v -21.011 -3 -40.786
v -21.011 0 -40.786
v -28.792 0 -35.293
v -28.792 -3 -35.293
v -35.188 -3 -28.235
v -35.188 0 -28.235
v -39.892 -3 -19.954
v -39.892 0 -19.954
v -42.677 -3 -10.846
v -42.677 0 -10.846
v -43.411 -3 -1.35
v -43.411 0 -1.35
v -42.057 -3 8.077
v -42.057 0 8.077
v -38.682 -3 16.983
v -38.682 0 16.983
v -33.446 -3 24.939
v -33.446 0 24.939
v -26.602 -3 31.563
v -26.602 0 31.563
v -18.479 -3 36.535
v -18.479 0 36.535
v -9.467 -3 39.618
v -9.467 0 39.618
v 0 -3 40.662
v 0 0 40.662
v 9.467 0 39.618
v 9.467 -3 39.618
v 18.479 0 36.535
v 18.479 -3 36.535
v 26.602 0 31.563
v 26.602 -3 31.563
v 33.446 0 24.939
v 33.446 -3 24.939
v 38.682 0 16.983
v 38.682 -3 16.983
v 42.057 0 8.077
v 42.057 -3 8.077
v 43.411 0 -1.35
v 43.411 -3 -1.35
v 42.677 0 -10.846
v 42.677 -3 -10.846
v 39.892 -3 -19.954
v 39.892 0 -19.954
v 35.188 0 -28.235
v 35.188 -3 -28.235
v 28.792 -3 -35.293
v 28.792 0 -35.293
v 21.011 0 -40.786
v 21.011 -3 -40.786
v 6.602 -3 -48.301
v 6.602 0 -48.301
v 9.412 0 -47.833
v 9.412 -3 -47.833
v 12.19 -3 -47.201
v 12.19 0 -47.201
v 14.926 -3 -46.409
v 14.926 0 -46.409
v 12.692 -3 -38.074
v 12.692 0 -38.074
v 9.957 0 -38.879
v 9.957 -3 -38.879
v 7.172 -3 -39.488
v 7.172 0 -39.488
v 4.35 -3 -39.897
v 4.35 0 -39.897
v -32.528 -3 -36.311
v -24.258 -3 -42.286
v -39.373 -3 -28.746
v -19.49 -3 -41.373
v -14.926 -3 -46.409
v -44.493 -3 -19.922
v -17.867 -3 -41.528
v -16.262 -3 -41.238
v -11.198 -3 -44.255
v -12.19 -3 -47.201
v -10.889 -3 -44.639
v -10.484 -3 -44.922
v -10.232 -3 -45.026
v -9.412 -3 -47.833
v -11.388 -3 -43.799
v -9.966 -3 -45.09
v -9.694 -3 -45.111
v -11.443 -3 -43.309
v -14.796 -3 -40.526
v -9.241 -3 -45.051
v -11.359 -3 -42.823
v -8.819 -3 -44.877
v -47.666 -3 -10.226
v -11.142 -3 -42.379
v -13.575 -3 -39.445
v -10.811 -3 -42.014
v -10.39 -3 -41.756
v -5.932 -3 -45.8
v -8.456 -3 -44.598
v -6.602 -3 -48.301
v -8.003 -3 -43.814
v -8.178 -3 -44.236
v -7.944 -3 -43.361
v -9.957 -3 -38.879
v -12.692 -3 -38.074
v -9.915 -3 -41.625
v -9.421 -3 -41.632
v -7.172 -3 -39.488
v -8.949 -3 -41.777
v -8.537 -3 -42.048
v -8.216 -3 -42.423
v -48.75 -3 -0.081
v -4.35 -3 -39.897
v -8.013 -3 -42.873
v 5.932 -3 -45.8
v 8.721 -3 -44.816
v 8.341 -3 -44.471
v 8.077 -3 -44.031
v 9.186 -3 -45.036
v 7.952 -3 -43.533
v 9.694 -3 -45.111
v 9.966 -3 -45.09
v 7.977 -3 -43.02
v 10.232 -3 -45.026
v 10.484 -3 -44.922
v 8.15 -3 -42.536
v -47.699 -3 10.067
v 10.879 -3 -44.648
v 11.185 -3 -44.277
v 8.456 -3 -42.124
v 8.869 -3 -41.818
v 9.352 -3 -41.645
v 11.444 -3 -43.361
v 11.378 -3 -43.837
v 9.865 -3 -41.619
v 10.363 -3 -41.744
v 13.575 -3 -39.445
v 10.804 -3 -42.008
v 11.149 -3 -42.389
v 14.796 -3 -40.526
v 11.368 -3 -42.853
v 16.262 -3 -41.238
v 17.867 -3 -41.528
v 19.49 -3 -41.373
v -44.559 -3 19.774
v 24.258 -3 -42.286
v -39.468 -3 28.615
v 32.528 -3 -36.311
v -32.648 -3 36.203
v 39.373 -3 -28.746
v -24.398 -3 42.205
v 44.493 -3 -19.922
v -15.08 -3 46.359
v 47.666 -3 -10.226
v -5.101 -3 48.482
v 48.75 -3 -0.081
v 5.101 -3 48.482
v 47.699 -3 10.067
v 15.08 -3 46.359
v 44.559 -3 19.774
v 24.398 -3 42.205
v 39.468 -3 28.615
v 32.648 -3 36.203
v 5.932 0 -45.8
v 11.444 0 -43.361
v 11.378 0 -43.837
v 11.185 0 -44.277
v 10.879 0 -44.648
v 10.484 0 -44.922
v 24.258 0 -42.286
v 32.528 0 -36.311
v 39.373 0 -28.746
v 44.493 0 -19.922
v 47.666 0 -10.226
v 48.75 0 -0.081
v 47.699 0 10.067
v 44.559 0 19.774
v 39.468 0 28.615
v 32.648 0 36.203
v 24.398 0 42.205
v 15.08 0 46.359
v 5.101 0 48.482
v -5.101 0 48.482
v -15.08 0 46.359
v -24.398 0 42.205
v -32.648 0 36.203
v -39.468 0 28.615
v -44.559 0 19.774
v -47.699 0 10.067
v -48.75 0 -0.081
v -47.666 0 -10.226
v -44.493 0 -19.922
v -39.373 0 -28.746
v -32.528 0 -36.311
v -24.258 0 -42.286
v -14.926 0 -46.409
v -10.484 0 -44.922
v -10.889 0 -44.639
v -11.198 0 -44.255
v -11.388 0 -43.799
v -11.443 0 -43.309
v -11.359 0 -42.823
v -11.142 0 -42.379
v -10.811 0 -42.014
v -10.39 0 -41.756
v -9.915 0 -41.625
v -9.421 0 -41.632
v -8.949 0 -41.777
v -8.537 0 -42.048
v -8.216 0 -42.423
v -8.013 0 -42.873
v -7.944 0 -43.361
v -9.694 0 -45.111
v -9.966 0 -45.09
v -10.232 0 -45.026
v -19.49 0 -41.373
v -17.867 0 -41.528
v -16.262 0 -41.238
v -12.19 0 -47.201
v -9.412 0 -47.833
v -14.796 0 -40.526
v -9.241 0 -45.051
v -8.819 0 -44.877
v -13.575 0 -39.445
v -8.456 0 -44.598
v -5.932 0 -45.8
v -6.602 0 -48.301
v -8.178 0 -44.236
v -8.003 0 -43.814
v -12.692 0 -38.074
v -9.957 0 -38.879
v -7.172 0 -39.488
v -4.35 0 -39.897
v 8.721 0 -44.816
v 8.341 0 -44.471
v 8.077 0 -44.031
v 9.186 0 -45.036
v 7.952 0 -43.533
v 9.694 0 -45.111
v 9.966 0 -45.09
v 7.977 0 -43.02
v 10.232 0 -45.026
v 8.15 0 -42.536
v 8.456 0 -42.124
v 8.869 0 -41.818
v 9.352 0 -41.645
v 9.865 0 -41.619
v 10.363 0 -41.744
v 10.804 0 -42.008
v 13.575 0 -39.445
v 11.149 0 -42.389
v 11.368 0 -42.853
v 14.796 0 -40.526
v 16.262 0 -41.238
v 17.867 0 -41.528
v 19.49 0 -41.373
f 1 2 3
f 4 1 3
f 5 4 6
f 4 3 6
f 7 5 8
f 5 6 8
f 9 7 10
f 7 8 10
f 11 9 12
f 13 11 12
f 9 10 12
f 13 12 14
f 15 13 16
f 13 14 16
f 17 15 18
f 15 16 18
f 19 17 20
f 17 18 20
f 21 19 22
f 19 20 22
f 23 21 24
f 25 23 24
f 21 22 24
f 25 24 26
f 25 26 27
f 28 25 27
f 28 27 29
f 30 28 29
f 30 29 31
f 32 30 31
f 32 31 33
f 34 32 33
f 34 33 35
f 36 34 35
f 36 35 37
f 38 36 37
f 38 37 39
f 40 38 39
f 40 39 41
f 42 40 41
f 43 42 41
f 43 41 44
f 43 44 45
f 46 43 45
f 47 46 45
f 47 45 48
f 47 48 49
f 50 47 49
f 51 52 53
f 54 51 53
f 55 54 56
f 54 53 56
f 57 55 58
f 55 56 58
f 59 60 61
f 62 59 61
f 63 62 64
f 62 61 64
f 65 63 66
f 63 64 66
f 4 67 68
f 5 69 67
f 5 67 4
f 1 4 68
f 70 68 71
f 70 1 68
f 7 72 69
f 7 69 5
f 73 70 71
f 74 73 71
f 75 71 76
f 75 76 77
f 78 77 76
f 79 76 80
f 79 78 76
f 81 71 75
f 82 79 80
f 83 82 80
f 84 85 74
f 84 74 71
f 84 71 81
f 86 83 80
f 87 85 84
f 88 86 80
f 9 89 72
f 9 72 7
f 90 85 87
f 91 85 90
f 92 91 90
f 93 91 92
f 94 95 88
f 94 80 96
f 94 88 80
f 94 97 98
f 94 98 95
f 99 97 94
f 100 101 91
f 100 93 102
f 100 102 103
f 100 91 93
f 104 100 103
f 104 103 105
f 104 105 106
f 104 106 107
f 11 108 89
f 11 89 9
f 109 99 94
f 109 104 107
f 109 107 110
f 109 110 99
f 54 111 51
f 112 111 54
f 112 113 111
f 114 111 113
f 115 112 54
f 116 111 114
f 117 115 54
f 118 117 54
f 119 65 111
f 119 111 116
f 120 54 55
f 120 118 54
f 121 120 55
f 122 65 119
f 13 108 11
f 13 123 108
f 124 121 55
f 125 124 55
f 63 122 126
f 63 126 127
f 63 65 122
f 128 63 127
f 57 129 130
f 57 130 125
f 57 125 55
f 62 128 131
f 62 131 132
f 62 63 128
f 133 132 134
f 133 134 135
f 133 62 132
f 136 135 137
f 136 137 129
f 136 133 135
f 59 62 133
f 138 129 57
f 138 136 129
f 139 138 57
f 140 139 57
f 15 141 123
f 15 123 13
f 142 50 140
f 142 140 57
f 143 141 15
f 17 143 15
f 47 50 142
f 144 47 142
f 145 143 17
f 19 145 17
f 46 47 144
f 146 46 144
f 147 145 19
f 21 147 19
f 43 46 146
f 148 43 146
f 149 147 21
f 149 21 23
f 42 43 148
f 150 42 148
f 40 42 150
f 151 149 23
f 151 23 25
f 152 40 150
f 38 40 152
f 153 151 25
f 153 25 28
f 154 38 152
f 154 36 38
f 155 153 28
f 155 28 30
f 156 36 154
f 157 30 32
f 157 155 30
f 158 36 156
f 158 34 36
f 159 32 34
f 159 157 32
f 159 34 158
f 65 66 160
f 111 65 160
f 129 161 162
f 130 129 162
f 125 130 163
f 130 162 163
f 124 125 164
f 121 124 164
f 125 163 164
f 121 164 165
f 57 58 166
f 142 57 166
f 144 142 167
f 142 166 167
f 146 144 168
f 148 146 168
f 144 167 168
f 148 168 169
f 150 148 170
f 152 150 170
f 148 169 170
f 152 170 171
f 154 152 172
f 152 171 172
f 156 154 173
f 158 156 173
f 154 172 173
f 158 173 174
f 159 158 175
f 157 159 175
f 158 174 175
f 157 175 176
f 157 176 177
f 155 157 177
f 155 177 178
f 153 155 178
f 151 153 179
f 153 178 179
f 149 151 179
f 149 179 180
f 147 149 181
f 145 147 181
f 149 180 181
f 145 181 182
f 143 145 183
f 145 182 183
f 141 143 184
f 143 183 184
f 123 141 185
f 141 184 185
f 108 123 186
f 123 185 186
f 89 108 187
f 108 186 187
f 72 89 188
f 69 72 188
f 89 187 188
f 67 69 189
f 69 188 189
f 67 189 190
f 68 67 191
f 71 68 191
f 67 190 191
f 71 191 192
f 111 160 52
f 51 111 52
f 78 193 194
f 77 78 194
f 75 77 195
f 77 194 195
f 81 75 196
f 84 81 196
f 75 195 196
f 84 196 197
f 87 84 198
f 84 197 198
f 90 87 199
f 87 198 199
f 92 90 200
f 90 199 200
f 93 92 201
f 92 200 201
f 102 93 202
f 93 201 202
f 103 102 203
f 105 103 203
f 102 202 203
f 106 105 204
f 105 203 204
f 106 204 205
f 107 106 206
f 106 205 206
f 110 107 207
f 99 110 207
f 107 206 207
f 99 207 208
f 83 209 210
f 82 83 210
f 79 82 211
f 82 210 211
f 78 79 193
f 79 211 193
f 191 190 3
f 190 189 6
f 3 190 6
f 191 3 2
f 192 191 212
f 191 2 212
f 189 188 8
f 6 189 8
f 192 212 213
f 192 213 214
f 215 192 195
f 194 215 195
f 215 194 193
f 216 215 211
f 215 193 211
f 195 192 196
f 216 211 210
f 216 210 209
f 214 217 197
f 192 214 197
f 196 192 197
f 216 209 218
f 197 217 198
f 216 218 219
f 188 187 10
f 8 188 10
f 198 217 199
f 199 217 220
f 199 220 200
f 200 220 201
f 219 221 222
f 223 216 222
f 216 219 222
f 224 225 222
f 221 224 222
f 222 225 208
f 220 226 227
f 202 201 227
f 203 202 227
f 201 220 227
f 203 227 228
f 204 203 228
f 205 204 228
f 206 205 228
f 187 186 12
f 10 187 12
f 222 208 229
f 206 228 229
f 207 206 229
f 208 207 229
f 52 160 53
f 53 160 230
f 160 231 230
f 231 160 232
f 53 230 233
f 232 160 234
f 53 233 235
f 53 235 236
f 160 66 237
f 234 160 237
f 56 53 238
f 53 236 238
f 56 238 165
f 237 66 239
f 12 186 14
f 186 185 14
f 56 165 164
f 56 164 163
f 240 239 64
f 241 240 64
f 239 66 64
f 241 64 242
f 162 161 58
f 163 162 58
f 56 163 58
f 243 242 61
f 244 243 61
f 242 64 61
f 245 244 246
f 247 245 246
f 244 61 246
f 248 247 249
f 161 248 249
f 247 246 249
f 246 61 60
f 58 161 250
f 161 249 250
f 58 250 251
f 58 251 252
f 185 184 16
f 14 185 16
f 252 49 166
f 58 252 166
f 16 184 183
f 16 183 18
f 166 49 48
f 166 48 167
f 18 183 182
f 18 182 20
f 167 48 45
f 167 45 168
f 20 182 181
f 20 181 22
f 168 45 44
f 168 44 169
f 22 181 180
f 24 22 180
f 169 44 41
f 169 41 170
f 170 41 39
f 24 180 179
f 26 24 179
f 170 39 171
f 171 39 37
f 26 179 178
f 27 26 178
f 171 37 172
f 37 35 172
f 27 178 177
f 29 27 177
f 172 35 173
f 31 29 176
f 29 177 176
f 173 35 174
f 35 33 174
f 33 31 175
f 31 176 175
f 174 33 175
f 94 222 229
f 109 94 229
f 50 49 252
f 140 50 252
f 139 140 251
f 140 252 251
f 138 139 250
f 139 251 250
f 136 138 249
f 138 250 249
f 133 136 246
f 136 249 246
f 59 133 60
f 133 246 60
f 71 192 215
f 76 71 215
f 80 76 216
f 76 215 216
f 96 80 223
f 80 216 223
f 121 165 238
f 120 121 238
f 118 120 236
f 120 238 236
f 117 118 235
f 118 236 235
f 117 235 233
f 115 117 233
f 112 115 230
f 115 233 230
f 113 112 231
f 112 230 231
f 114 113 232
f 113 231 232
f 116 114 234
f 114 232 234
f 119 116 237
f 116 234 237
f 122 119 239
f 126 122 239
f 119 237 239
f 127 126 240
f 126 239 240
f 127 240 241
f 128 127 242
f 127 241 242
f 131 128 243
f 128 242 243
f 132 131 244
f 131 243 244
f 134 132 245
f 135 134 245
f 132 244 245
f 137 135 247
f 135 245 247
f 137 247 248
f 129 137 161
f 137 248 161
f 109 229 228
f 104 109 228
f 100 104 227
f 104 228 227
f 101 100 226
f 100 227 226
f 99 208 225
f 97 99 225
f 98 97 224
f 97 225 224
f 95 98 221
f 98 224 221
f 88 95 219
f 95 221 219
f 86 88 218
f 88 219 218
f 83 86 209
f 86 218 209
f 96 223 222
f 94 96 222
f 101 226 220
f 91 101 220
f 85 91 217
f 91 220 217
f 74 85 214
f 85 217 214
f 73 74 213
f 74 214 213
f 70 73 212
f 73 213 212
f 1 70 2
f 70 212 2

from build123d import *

# Parameters (mm, degrees)
F1_DEPTH    = 3
F2_T1_DEPTH = 3


# Not quite as in the source:
# - a fillet or chamfer that OpenCascade refuses, or shapes differently, is made with other operations: its cross-section is extruded or revolved along the edge and cut away or added


with BuildPart() as f1:
    # F0 (on Front) → F1 (new body)
    with BuildSketch(Plane.XZ):
        with BuildLine():
            Line((-12.6923788449, -38.0739606037), (-14.2292520278, -43.8096494069))
            ThreePointArc((-14.2292520278, -43.8096494069), (-12.3693152355, -44.4080485447), (-10.4843489922, -44.9221970263))
            ThreePointArc((-10.4843489922, -44.9221970263), (-10.6097140662, -41.870019803), (-7.9435705793, -43.3610533745))
            ThreePointArc((-7.9435705793, -43.3610533745), (-8.4561337122, -44.5984902415), (-9.6935705793, -45.1110533745))
            ThreePointArc((-9.6935705793, -45.1110533745), (-7.8201224186, -45.4967770693), (-5.9315086401, -45.7996446565))
            Line((-5.9315086401, -45.7996446565), (-4.35, -39.8973740589))
            ThreePointArc((-4.35, -39.8973740589), (-8.5698237047, -39.2081761686), (-12.6923788449, -38.0739606037))
        make_face()
        with BuildLine():
            Line((-14.2292520278, -43.8096494069), (-14.9257175554, -46.4088941417))
            ThreePointArc((-14.9257175554, -46.4088941417), (-10.8052141087, -47.537457316), (-6.6017256924, -48.3009287476))
            Line((-6.6017256924, -48.3009287476), (-5.9315086401, -45.7996446565))
            ThreePointArc((-5.9315086401, -45.7996446565), (-7.8201224186, -45.4967770693), (-9.6935705793, -45.1110533745))
            ThreePointArc((-9.6935705793, -45.1110533745), (-10.1000792565, -45.063184596), (-10.4843489922, -44.9221970263))
            ThreePointArc((-10.4843489922, -44.9221970263), (-12.3693152355, -44.4080485447), (-14.2292520278, -43.8096494069))
        make_face()
        with BuildLine():
            ThreePointArc((14.9257175554, -46.4088941417), (39.3966447228, -28.7135313848), (48.75, 0))
            ThreePointArc((48.75, 0), (-28.7135313848, 39.3966447228), (-14.9257175554, -46.4088941417))
            Line((-14.9257175554, -46.4088941417), (-14.2292520278, -43.8096494069))
            ThreePointArc((-14.2292520278, -43.8096494069), (-25.1843873236, 32.6155595225), (43.434381424, -2.7721802304))
            ThreePointArc((43.434381424, -2.7721802304), (35.3877397529, -27.956567554), (14.2292520278, -43.8096494069))
            Line((14.2292520278, -43.8096494069), (14.9257175554, -46.4088941417))
        make_face()
        with BuildLine():
            ThreePointArc((10.4843489922, -44.9221970263), (12.3693152355, -44.4080485447), (14.2292520278, -43.8096494069))
            Line((14.2292520278, -43.8096494069), (12.6923788449, -38.0739606037))
            ThreePointArc((12.6923788449, -38.0739606037), (8.5698237047, -39.2081761686), (4.35, -39.8973740589))
            Line((4.35, -39.8973740589), (5.9315086401, -45.7996446565))
            ThreePointArc((5.9315086401, -45.7996446565), (7.8201224186, -45.4967770693), (9.6935705793, -45.1110533745))
            ThreePointArc((9.6935705793, -45.1110533745), (8.4561337122, -42.1236165074), (11.4435705793, -43.3610533745))
            ThreePointArc((11.4435705793, -43.3610533745), (11.1846041508, -44.2771968614), (10.4843489922, -44.9221970263))
        make_face()
        with BuildLine():
            ThreePointArc((6.6017256924, -48.3009287476), (10.8052141087, -47.537457316), (14.9257175554, -46.4088941417))
            Line((14.9257175554, -46.4088941417), (14.2292520278, -43.8096494069))
            ThreePointArc((14.2292520278, -43.8096494069), (12.3693152355, -44.4080485447), (10.4843489922, -44.9221970263))
            ThreePointArc((10.4843489922, -44.9221970263), (10.1000792565, -45.063184596), (9.6935705793, -45.1110533745))
            ThreePointArc((9.6935705793, -45.1110533745), (7.8201224186, -45.4967770693), (5.9315086401, -45.7996446565))
            Line((5.9315086401, -45.7996446565), (6.6017256924, -48.3009287476))
        make_face()
    extrude(amount=F1_DEPTH)

    # F2: fillet of radius 5.9832263303 on 2 edges, made by hand

    # F2_s2 → F2_t1 (join)
    with BuildSketch(Plane.XZ):
        with BuildLine():
            ThreePointArc((21.0114203914, -40.7862000497), (16.2624097338, -41.2381768967), (12.6923788449, -38.0739606037))
            Line((12.6923788449, -38.0739606037), (12.5838858344, -38.124446895))
            ThreePointArc((12.5838858344, -38.124446895), (13.3452283796, -40.9727764638), (14.113664971, -43.8406208654))
            Line((14.113664971, -43.8406208654), (14.2684545363, -43.9227102855))
            ThreePointArc((14.2684545363, -43.9227102855), (17.7337895054, -42.5524219145), (21.0693082118, -40.8909311299))
            Line((21.0693082118, -40.8909311299), (21.0114203914, -40.7862000497))
        make_face()
        with BuildLine():
            ThreePointArc((-12.6923788449, -38.0739606037), (-16.2624097338, -41.2381768967), (-21.0114203914, -40.7862000497))
            Line((-21.0114203914, -40.7862000497), (-21.0693082118, -40.8909311299))
            ThreePointArc((-21.0693082118, -40.8909311299), (-17.7337895054, -42.5524219145), (-14.2684545363, -43.9227102855))
            Line((-14.2684545363, -43.9227102855), (-14.113664971, -43.8406208654))
            ThreePointArc((-14.113664971, -43.8406208654), (-13.3452283796, -40.9727764638), (-12.5838858345, -38.124446895))
            Line((-12.5838858345, -38.124446895), (-12.6923788449, -38.0739606037))
        make_face()
    extrude(amount=F2_T1_DEPTH)


solid = f1.part
